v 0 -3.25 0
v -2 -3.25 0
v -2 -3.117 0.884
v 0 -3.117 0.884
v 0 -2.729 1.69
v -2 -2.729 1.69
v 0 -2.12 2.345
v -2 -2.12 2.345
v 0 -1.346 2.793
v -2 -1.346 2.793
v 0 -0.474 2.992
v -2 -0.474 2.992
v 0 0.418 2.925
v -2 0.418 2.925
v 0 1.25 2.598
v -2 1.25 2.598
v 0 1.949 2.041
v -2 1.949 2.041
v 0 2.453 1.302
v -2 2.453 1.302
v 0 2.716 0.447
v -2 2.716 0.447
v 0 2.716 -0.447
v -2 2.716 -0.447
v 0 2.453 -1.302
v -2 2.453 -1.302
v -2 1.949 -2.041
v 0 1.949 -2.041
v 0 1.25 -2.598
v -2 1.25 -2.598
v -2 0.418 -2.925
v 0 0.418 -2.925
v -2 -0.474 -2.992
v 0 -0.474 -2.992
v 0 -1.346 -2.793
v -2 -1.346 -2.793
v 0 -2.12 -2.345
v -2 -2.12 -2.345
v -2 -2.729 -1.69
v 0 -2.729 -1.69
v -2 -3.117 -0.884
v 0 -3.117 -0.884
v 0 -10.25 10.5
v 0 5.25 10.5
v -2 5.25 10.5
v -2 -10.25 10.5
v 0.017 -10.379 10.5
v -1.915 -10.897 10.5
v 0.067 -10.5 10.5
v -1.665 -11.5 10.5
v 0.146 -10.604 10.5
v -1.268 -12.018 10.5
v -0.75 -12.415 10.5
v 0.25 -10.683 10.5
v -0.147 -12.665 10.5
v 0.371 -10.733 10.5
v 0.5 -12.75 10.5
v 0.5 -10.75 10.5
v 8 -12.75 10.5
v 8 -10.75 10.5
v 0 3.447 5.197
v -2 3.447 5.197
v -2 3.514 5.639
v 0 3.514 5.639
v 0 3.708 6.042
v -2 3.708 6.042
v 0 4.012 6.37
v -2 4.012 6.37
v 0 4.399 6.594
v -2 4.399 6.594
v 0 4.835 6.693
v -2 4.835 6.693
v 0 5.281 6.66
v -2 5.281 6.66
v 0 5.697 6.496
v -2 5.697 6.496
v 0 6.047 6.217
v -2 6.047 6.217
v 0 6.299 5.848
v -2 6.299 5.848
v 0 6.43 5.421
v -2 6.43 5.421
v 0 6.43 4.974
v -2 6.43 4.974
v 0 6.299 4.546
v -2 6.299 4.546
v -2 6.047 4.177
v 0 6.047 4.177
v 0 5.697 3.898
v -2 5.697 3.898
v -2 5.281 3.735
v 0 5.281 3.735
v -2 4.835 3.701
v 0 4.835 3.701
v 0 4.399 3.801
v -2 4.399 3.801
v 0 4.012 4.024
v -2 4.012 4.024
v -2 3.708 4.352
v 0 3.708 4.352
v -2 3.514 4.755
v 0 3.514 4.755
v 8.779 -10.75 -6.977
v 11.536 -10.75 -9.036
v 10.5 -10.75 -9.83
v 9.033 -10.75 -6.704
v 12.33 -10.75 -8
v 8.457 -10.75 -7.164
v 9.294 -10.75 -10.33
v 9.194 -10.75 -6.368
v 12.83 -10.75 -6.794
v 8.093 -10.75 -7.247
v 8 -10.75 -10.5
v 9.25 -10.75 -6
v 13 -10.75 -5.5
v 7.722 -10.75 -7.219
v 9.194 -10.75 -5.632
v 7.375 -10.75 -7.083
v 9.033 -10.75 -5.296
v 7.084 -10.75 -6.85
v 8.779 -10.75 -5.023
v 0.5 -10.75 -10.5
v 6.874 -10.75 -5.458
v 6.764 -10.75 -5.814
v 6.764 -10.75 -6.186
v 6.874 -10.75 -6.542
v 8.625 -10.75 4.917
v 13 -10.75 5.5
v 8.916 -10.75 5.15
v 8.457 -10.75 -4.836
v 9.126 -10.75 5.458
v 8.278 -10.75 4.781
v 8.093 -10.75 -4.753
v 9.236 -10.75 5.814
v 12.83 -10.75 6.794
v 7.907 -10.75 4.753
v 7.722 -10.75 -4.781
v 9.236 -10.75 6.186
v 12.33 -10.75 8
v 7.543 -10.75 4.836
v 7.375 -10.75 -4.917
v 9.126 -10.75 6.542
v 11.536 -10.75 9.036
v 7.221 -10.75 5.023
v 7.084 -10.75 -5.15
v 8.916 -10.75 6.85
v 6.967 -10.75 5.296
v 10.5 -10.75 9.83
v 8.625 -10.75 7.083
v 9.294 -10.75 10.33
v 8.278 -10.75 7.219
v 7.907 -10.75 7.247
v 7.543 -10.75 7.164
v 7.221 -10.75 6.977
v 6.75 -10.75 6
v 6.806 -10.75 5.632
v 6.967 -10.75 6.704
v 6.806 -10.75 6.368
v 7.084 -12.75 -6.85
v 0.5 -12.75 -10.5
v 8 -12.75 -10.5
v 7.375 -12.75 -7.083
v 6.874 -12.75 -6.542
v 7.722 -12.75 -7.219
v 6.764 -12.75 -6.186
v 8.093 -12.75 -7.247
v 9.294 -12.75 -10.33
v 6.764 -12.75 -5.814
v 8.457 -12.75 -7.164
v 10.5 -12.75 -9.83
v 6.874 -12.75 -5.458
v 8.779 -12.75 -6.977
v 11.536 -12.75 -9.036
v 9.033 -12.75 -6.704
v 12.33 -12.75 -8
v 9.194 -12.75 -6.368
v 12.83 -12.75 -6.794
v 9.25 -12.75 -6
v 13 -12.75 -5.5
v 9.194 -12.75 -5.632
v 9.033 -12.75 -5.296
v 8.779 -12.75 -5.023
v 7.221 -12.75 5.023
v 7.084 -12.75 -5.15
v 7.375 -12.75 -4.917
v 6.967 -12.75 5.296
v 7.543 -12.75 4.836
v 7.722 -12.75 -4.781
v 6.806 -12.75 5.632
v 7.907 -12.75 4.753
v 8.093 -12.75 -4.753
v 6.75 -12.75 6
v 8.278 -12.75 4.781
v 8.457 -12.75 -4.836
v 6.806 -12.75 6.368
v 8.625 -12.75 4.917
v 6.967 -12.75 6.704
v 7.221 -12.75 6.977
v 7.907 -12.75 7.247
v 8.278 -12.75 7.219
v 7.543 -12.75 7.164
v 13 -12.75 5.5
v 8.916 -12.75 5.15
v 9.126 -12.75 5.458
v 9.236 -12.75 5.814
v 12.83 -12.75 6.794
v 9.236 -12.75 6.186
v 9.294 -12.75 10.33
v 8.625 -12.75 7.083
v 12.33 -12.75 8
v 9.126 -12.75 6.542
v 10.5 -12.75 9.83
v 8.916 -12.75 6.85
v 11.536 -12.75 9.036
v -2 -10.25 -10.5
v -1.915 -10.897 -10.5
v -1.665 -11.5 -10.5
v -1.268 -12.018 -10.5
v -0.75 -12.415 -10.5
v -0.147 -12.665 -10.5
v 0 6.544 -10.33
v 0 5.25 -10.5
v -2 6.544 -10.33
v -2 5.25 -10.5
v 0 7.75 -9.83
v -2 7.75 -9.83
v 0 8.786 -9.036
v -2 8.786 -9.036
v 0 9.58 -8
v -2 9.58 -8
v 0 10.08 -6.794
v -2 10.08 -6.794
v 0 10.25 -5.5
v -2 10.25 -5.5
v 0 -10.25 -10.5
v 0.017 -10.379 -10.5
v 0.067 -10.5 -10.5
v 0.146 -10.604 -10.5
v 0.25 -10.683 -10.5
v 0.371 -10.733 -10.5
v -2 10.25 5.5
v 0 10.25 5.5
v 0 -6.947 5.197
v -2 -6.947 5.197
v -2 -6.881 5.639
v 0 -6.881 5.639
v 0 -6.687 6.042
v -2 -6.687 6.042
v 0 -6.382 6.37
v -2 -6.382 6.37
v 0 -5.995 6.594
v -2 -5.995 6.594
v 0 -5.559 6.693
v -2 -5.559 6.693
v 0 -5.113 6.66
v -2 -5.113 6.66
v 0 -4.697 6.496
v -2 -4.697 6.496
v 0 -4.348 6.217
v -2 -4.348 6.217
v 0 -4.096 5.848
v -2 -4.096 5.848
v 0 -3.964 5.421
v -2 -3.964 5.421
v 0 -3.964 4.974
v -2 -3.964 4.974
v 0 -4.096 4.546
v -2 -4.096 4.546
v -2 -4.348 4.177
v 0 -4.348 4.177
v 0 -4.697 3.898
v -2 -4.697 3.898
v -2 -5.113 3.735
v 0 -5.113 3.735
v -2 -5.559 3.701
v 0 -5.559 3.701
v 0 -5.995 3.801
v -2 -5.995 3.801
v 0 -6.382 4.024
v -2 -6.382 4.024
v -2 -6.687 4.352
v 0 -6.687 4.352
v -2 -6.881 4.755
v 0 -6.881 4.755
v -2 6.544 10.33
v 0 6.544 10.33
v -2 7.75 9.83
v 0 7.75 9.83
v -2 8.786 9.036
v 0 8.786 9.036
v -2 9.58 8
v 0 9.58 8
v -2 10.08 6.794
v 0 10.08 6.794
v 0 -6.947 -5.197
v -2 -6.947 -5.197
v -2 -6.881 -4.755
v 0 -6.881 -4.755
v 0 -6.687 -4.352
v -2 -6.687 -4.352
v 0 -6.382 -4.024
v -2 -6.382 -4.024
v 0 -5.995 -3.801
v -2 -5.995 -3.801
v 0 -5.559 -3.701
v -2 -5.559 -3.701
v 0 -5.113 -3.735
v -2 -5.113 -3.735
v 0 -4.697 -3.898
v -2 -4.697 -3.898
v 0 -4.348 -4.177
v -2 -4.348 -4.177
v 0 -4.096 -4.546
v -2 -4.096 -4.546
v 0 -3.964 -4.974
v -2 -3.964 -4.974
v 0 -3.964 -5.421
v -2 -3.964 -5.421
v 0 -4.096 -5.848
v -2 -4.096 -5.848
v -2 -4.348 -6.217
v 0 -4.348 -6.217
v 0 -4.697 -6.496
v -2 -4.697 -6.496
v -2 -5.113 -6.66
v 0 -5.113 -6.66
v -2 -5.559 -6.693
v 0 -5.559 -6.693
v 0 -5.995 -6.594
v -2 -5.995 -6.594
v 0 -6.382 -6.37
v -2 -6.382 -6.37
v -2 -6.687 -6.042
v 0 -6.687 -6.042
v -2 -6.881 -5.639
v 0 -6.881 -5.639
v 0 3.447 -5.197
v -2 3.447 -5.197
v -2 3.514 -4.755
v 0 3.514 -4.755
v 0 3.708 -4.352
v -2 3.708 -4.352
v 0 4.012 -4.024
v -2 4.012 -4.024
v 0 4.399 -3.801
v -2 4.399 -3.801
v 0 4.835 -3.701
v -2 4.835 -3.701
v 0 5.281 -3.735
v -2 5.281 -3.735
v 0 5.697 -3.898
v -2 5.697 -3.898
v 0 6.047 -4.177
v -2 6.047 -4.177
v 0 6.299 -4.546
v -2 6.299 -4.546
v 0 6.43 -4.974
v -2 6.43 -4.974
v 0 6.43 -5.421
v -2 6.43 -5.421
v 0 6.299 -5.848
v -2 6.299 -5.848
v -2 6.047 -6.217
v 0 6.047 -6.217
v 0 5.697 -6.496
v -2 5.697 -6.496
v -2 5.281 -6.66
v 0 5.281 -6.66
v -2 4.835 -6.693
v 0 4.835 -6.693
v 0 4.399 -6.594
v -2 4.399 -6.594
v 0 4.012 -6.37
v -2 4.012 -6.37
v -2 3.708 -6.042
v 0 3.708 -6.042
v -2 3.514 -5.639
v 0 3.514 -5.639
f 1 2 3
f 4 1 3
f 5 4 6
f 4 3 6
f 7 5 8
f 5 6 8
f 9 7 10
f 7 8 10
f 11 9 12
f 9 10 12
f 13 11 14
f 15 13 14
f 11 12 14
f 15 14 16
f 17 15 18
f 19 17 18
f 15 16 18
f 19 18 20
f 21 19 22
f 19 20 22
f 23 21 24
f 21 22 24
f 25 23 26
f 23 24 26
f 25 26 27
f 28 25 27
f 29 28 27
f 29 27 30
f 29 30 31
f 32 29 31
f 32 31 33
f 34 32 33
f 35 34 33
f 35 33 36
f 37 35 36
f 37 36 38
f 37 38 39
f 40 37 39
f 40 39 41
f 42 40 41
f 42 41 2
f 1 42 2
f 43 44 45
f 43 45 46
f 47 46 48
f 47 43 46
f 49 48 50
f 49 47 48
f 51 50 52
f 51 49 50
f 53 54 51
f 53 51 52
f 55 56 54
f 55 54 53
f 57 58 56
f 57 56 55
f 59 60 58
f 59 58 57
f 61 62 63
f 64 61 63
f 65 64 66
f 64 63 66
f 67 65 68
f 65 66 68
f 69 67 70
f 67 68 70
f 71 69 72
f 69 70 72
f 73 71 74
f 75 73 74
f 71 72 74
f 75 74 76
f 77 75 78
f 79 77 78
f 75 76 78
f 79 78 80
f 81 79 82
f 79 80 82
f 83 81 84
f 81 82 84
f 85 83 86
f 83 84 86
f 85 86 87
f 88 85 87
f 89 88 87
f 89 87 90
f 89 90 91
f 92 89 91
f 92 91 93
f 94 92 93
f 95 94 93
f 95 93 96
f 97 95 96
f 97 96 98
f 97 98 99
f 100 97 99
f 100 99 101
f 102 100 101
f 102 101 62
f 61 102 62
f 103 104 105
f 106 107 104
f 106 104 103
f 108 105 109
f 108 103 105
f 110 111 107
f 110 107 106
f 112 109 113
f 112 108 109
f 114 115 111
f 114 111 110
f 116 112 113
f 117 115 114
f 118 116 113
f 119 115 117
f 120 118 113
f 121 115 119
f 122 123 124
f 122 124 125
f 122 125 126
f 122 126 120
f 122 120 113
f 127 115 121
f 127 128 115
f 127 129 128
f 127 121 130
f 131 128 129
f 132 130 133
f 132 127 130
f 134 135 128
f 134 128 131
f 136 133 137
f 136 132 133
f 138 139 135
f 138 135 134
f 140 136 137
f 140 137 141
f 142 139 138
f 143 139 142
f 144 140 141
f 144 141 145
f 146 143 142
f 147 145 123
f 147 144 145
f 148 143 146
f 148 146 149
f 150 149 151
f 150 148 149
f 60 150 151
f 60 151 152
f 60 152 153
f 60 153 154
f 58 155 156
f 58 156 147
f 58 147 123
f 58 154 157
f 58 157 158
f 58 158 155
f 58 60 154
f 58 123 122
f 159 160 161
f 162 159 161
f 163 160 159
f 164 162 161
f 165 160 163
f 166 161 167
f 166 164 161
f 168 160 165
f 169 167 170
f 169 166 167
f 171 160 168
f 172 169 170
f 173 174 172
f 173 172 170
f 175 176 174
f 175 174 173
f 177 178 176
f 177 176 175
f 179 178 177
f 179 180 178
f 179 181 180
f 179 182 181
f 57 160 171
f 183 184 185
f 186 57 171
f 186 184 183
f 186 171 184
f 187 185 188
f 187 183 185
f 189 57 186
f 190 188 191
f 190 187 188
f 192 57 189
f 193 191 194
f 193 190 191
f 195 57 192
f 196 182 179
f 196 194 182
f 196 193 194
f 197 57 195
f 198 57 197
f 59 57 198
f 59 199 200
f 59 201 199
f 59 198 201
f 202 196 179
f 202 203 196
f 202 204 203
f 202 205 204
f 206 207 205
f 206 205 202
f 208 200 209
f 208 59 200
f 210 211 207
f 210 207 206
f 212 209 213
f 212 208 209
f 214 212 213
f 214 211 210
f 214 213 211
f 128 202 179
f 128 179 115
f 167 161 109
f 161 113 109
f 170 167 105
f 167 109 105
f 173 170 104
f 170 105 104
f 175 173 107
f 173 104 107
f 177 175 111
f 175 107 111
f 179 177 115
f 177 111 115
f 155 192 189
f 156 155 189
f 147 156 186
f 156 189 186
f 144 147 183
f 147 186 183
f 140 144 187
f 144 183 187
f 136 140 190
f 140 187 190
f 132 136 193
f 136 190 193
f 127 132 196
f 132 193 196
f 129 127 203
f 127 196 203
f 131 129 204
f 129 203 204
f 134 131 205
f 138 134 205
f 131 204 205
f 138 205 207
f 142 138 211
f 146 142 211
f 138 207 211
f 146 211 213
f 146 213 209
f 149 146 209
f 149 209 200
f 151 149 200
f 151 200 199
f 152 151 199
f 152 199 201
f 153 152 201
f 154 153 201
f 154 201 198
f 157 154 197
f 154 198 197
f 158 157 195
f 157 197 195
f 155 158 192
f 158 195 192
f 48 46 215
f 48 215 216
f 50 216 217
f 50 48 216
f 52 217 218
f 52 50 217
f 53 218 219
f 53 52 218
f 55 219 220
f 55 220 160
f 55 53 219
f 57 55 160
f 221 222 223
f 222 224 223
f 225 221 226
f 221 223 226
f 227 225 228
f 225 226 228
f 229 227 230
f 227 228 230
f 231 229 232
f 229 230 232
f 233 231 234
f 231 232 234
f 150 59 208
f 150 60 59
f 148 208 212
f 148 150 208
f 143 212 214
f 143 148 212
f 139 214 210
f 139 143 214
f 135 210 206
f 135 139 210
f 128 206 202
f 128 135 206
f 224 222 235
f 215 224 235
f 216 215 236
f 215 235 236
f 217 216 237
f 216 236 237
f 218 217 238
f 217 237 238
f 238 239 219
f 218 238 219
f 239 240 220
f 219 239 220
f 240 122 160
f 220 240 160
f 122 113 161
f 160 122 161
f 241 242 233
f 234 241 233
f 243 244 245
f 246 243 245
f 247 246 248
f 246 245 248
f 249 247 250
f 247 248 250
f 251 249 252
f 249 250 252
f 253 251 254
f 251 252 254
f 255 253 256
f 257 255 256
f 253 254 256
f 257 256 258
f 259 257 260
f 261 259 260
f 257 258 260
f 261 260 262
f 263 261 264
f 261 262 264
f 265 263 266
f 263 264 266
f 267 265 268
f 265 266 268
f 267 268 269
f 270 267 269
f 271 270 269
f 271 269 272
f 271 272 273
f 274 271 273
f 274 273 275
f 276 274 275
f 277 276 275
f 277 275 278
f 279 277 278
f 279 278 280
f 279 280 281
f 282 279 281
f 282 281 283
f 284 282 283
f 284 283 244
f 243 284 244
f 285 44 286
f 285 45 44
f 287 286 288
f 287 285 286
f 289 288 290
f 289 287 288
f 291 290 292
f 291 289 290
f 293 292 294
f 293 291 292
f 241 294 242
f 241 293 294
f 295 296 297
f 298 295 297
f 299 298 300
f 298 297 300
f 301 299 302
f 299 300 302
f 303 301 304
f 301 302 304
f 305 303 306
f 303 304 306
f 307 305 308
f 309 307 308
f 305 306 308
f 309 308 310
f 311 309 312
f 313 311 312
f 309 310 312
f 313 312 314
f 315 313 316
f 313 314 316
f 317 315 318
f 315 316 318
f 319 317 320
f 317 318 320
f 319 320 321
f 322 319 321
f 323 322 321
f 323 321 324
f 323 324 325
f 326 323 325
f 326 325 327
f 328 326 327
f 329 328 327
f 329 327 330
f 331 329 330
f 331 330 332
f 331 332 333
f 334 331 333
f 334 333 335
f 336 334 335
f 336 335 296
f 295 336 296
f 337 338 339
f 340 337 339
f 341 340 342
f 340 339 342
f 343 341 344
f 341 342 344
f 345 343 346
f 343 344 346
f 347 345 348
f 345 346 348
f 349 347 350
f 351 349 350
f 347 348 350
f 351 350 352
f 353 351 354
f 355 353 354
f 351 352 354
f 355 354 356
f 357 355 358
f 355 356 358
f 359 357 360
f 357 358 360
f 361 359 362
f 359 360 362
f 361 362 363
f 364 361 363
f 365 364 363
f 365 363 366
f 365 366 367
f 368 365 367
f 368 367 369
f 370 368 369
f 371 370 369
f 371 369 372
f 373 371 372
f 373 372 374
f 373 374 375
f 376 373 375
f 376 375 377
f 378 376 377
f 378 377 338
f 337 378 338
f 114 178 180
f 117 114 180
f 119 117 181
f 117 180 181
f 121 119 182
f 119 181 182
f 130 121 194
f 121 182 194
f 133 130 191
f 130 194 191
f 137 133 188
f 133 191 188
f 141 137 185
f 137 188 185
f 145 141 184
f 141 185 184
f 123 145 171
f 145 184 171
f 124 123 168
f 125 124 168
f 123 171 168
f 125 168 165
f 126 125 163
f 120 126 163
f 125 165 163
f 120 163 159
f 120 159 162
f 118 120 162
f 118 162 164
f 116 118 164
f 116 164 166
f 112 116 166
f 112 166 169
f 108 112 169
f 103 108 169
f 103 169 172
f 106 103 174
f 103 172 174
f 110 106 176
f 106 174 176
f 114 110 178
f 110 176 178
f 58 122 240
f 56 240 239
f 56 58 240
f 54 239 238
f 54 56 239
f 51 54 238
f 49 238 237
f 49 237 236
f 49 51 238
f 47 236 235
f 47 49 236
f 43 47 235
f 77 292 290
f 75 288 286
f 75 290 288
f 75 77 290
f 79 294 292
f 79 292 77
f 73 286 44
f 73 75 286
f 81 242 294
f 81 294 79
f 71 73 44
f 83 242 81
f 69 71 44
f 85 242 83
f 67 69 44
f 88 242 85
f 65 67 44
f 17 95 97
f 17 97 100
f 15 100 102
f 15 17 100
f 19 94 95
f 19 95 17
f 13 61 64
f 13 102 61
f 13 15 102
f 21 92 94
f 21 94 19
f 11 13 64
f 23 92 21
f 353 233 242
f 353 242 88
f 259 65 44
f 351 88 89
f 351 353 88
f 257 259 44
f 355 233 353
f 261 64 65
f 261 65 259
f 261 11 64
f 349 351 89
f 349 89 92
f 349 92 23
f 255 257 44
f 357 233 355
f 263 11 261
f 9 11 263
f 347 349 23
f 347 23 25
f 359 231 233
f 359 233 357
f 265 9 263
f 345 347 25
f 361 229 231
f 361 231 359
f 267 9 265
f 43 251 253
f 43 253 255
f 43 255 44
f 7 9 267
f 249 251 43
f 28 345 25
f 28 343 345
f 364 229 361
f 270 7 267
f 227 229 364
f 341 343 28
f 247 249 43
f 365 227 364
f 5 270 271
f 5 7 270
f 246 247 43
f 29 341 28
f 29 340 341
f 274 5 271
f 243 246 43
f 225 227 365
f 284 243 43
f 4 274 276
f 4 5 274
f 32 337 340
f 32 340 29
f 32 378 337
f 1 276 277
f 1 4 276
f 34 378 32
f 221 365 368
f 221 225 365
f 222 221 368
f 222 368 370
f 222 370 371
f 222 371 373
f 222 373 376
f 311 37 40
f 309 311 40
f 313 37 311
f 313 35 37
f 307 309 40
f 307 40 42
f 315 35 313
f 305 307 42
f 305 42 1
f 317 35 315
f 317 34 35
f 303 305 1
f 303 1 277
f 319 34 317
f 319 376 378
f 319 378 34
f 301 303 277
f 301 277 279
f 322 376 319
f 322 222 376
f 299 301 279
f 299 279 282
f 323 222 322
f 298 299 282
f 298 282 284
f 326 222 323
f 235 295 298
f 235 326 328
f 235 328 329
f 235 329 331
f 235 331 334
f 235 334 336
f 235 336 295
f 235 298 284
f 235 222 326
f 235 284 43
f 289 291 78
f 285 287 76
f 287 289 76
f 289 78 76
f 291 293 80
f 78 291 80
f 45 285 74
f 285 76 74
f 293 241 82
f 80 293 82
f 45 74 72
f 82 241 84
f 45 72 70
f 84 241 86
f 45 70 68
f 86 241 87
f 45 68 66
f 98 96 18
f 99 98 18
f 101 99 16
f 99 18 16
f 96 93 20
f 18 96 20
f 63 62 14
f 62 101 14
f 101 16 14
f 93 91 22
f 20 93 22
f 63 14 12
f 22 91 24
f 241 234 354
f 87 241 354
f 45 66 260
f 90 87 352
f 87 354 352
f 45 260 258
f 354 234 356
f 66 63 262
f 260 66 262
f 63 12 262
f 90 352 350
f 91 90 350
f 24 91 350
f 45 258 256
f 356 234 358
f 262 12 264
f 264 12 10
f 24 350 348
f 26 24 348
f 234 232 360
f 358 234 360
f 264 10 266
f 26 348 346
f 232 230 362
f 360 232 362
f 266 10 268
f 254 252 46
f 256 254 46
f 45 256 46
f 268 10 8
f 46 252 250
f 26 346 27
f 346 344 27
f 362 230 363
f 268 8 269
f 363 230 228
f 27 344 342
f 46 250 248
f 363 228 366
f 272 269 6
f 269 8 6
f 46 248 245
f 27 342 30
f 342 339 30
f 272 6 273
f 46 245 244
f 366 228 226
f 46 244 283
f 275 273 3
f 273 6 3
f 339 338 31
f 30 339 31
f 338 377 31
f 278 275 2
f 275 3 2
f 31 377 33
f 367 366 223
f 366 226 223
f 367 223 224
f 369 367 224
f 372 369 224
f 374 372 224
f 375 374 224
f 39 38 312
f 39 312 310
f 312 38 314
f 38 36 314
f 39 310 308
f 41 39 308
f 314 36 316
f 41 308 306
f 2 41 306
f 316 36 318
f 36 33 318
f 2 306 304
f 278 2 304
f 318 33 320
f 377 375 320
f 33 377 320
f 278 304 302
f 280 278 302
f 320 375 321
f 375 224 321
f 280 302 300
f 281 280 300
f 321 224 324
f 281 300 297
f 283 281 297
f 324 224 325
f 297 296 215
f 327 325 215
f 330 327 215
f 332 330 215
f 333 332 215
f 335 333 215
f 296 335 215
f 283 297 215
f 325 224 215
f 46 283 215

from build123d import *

# Parameters (mm, degrees)
CROQUIS_BASE_W         = 20.5
CROQUIS_BASE_H         = 21
BRIDA_BASE1_DEPTH      = 2
BRIDA_DE_ARISTA1_DEPTH = 21
CROQUIS11_R            = 3
CROQUIS11_R_2          = 1.5
CORTAR_EXTRUIR1_DEPTH  = 10
CROQUIS12_R            = 1.25
CORTAR_EXTRUIR2_DEPTH  = 2
REDONDEO1_R            = 5


# Sheet-metal steps are written as plain solids
with BuildPart() as part:
    # Croquis base → Brida base1 (new body)
    with BuildSketch(Plane(origin=(0, 0, 0), x_dir=(0, -1, 0), z_dir=(1, 0, 0))):
        Rectangle(CROQUIS_BASE_W, CROQUIS_BASE_H)
    extrude(amount=-BRIDA_BASE1_DEPTH)

    # Brida de arista1 section (across the edge) → Brida de arista1 (add)
    with BuildSketch(Plane(origin=(0, -10.75, 10.5), x_dir=(0, 1, 0), z_dir=(0, 0, -1))):
        with BuildLine():
            Line((-2, 0.5), (-2, 13))
            Line((-2, 13), (0, 13))
            Line((0, 13), (0, 0.5))
            ThreePointArc((0, 0.5), (0.146446609, 0.146446609), (0.5, 0))
            Line((0.5, 0), (0.5, -2))
            ThreePointArc((0.5, -2), (-1.267766953, -1.267766953), (-2, 0.5))
        make_face()
    extrude(amount=BRIDA_DE_ARISTA1_DEPTH)

    # Croquis11 → Cortar-Extruir1 (cut)
    with BuildSketch(Plane(origin=(-2, 0, 0), x_dir=(0, -1, 0), z_dir=(-1, 0, 0))):
        with Locations((0.25, 0)):
            Circle(CROQUIS11_R)
        with Locations((-4.947234842, 5.197234842)):
            Circle(CROQUIS11_R_2)
        with Locations((5.447234842, 5.197234842)):
            Circle(CROQUIS11_R_2)
        with Locations((5.447234842, -5.197234842)):
            Circle(CROQUIS11_R_2)
        with Locations((-4.947234842, -5.197234842)):
            Circle(CROQUIS11_R_2)
    extrude(amount=-CORTAR_EXTRUIR1_DEPTH, mode=Mode.SUBTRACT)

    # Croquis12 → Cortar-Extruir2 (cut)
    with BuildSketch(Plane(origin=(0, -12.75, 0), x_dir=(0, 0, -1), z_dir=(0, -1, 0))):
        with Locations(Location((6, 8, 0), (0, 0, 90))):
            Circle(CROQUIS12_R)
        with Locations(Location((-6, 8, 0), (0, 0, 270))):
            Circle(CROQUIS12_R)
    extrude(amount=-CORTAR_EXTRUIR2_DEPTH, mode=Mode.SUBTRACT)

    # Redondeo1
    redondeo1_edges = [part.edges().sort_by_distance(p)[0] for p in [
        (13, -11.75, 10.5),
        (13, -11.75, -10.5),
        (-1, 10.25, 10.5),
        (-1, 10.25, -10.5),
    ]]
    fillet(redondeo1_edges, radius=REDONDEO1_R)


solid = part.part
